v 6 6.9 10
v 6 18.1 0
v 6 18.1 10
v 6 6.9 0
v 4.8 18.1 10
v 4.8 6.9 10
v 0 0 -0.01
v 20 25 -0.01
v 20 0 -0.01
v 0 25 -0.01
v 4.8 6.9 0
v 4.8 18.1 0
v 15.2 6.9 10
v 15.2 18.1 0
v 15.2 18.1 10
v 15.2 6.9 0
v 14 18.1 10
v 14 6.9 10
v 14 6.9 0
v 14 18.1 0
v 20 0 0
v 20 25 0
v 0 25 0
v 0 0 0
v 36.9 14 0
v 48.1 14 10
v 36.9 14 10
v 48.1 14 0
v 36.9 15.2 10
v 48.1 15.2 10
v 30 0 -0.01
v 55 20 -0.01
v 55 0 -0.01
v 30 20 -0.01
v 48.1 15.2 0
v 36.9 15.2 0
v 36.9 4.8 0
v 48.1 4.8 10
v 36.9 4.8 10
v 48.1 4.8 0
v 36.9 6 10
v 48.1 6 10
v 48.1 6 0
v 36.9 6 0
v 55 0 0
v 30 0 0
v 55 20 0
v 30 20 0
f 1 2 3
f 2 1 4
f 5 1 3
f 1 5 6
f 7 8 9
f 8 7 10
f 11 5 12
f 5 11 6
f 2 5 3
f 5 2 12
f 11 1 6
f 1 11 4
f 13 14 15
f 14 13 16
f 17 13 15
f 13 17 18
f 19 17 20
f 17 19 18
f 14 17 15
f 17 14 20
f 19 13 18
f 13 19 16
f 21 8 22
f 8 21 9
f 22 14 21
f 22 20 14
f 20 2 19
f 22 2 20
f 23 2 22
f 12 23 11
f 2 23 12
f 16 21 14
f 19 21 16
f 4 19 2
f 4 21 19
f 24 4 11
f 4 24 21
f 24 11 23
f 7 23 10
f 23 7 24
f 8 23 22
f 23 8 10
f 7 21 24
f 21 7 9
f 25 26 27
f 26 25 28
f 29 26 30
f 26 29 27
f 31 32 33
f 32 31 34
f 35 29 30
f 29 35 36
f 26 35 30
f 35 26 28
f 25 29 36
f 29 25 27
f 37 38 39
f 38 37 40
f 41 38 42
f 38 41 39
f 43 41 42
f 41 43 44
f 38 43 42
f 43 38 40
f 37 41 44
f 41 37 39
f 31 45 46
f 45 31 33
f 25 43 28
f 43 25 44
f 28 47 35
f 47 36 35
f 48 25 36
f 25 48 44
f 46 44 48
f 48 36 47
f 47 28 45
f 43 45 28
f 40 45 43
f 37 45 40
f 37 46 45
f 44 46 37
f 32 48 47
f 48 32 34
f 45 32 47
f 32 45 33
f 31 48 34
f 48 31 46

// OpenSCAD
// file: ../../Base/Boxes.scad
// Fischertechnik Box Foundation
// Pre-designed Boxes

use <Constants.scad>

include <PlacementOptions.scad>

box190Width = 190;
box190Depth = 130;
box130Width = 130;
box130Depth = 95;
boxUsageHeight = 33.9;
boxWallThickness = 2.4;
boxBaseThickness = 1.0;

// getBoxWallThickness()
// Gets the wall thickness of a Fischertechnik Box

function getBoxWallThickness() = boxWallThickness;

// Gets the usable height of a fischertechnik box
function getBoxUsageHeight() = boxUsageHeight;

// Gets the thickness of the Fischertechnik box base.
function getBoxBaseThickness() = boxBaseThickness;

// Gets the usable inner space of a Box 190 as an x/y-list
function getBox190Space() = [
    box190Width - 2*getBoxWallThickness(), 
    box190Depth - 2*getBoxWallThickness() ];

// Imports the Fischertechnik empty box 130x190 mm and places it at position 0,0
// 190x130 are the outer sizes, the inner space is slightly smaller. Use getBox190Space() to get the inner sizes.
// This module needs the STL file "Fischertechnik Box 130x190.stl" in the library path.
// The box is positioned that the usable inner space is at the 0,0,0 position. The

module Box190() {
    translate([-getBoxWallThickness(),-getBoxWallThickness(),-getBoxBaseThickness()])
        import("Fischertechnik Box 130x190.stl", convexity=3);
}

// Gets the usable inner space of a Box 130 as an x/y-list
function getBox130Space() = [
    box130Width - 2*getBoxWallThickness(), 
    box130Depth - 2*getBoxWallThickness() ];

// Imports the Fischertechnik empty box 95x130 mm and places it at position 0,0
// 190x130 are the outer sizes, the inner space is slightly smaller. Use getBox190Space() to get the inner sizes.
// This module needs the STL file "Fischertechnik Box 95x130.stl" in the library path.
// The box is positioned that the usable inner space is at the 0,0,0 position. The

module Box130() {
    translate([-getBoxWallThickness(),-getBoxWallThickness(),-getBoxBaseThickness()])
        import("Fischertechnik Box 95x130.stl", convexity=3);
}

// Creates a web at the specified box walls
// corner 0 = LowerLeft, 1 = UpperLeft, 2 = UpperRight, 3 = LowerRight
// side 0 = LeftOfCorner, 1 = RightOfCorner
// distance = Distance in mm from the corner
// box = inner width and depth of the box (default: Box 190)
// webWidth = length of the web (default is 3 mms)
// webThickness = thickness of the web (default is 1 mm)

module BoxWeb(corner, side, distance, box=getBox190Space(), webWidth=3, webThickness=1.0) {
    sink = getBoxWallThickness()/2;

    width = (corner % 2 == 0) ? 
            (side == LeftOfCorner ? webWidth : webThickness) :
            (side == LeftOfCorner ? webThickness : webWidth);

    depth = (corner % 2 == 0) ? 
            (side == RightOfCorner ? webWidth : webThickness) :
            (side == RightOfCorner ? webThickness : webWidth);
    
    xDiff = corner == LowerLeft ? 
                (side == LeftOfCorner ? -sink : distance) :
            (corner == UpperLeft ?                
                (side == LeftOfCorner ? distance : -sink) :
            (corner == UpperRight ?
                (side == LeftOfCorner ? box.x-webWidth+sink : box.x-distance-webThickness) :
                (side == LeftOfCorner ? box.x-distance-webThickness: box.x-webWidth+sink)));

    yDiff = corner == LowerLeft ? 
                (side == RightOfCorner ? -sink : distance) :
            (corner == UpperLeft ?
                (side == RightOfCorner ? box.y-distance : box.y-webWidth+sink) :
            (corner == UpperRight ?
                (side == RightOfCorner ? box.y-webWidth+sink : box.y-distance) :
                (side == RightOfCorner ? distance : -sink)));
    
    translate([xDiff, yDiff, -getExcess()])
        cube([width, depth, boxUsageHeight + 2*getExcess()]);
}
// file: ../../Base/Rotation.scad
// Fischertechnik Box Foundation
// Geometry Helpers Rotation

include <PlacementOptions.scad>

// getRotatedSpace(space, rotation=NoRotation)
// Rotates the space dependent on the specified rotation

function getRotatedSpace(space, rotation=NoRotation) = [
    (rotation == Rotate90 || rotation == Rotate270) ? space.y : space.x,
    (rotation == Rotate90 || rotation == Rotate270) ? space.x : space.y
];

// Rotates the given space around the fixed left lower corner
// space = the space the children needs as width/depth list [width,depth]
// rotation = 0 Rotate0 degrees, 1 Rotate90 degrees, 2 Rotate180 degrees, 3 Rotate270 degrees (equivalent to -90)

module RotateFix(space, rotation=Rotate0) {
    dy = (rotation == Rotate0 || rotation == Rotate270) ? 0 :
        (rotation == Rotate90) ? space.x :
        space.y;
    dx = (rotation < Rotate180) ? 0 :
        (rotation == Rotate180) ? space.x :
        space.y;
    
    translate([dx, dy, 0])
        rotate([0, 0, rotations[rotation]])
            children();
}
// file: ../../Base/Alignment.scad
// Fischertechnik Box Foundation
// Geometry Helpers Alignment

include <PlacementOptions.scad>

// getAlignedX(elementWidth, spaceWidth, align=AlignRight, offset=0)
// Gets the aligned X offset of an element with the given
// width in the given space.
// elementWidth = The width of the element to positon
// spaceWidth = The space where the element should be aligned
// align = 0 AlignLeft, 1 AlignCenter, 2 AlignRight
// offset = an optional offset from the aligned position. When
// aligned left or centered, then positive values are in X direction.
// When aligned right then positive values are in negative X direction.

function getAlignedX(elementWidth, spaceWidth, align=AlignRight, offset=0) =
    (align == AlignLeft) ?
        offset :
        ((align == AlignCenter) ?
        (spaceWidth - elementWidth)/2 + offset :
        spaceWidth - offset - elementWidth);

// getAlignedY(elementDepth, spaceDepth, align=AlignTop, offset=0)
// Gets the aligned Y offset of an element with the given
// depth in the given space.
// elementDepth = The depth of the element to positon
// spaceDepth = The space where the element should be aligned
// align = 0 AlignBottom, 1 AlignCenter, 2 AlignTop
// offset = an optional offset from the aligned position. When
// aligned bottom or centered, then positive values are in Y direction.
// When aligned top then positive values are in negative Y direction.

function getAlignedY(elementDepth, spaceDepth, align=AlignTop, offset=0) =
    (align == AlignBottom) ?
        offset :
        ((align == AlignCenter) ?
        (spaceDepth - elementDepth)/2 + offset :
        spaceDepth - offset - elementDepth);
// file: ../../Base/Constants.scad
// Fischertechnik Box Foundation
// Constants

// Constant values necessary for multiple elements

// Base constants
dividerThickness = 1.2;
excess = 0.01;
fragments = 90;
tolerance = 0.8;

// Gets the thickness of a divider 
function getDividerThickness() = dividerThickness;

// Gets the excess that is used to merge walls into each other
function getExcess() = excess;

// Gets amount of fragments of a cylinder
function getFragments() = fragments;

// Gets the inner tolerance of a frame to each side
function getTolerance() = tolerance;


// Fischertechnik specific constants
axisDiameter = 4;
axisBottomDiameter = axisDiameter + 1;
standardEdgeDistance = 2.5;
standardWebDistance = 11.5;
standardCornerLength = 15;
tubeWallFactor = 1.6;

// Gets axis diameter
function getAxisDiameter() = axisDiameter;

// Gets axis bottom diameter for thicker part at the bottom
function getAxisBottomDiameter() = axisBottomDiameter;

// gets the standard distance to the wall of the box for dockable frames with webs
function getStandardEdgeDistance() = standardEdgeDistance;

// gets the standard distance of each web to the corner of the dockable frame
function getStandardWebDistance() = standardWebDistance;

// gets the standard length of the corner walls of a dockable frame
function getStandardCornerLength() = standardCornerLength;

// gets the wall thickness of a tube.
function getTubeWallThickness() = tubeWallFactor * getDividerThickness();
// file: ../../Base/PlacementOptions.scad
// Fischertechnik Box Foundation
// Placement Options

// Alignment
NoAlign = 0;
AlignLeft = 1;
AlignBottom = 2;
AlignCenter = 3;
AlignRight = 4;
AlignTop = 5;

// Element rotation degree steps
rotations = [0, -90, -180, -270];

// Rotation
NoRotation = 0;
Rotate0 = 0;
Rotate90 = 1;
Rotate180 = 2;
Rotate270 = 3;

// Docking (seen from above)
NoDock = -1;
DockLeft = 0;
DockTop = 1;
DockRight = 2;
DockCorner = 2;
DockBottom = 3;

// Web corners
LowerLeft = 0;
UpperLeft = 1;
UpperRight = 2;
LowerRight = 3;

// Web position relative to corner
LeftOfCorner = 0;
RightOfCorner = 1;
// file: ../../Elements/HolderWinchDrum.scad
// Fischertechnik Box Library
// Holder for Winch Drum
// 31016

use <../Base/Constants.scad>
use <../Base/Placement.scad>
use <../ModelBase/Simple.scad>

width = 20;
depth = 25;
height = 10;

// getWinchDrumHolderSpace()
// Gets the space the winch drum holder needs as width and depth (.x and .y as a list)

function getHolderWinchDrumSpace() = [width, depth, height];

// HolderWinchDrum()
// Two walls for holding the 31016 winch drum.

module HolderWinchDrum() {
    holderDepth = 11.2;
    holderDistance = 8;
    
    Space(getHolderWinchDrumSpace());
    
    module Holders() {
        Wall([getDividerThickness(), holderDepth, height]);
        translate([holderDistance + getDividerThickness(), 0])
            Wall([getDividerThickness(), holderDepth, height]);
    }
    
    Center(getHolderWinchDrumSpace(), [holderDistance + 2*getDividerThickness(), holderDepth]) {
        Holders();
    }
}

// Tests
color("lightgray")
HolderWinchDrum();
// file: ../../Base/Placement.scad
// Fischertechnik Box Foundation
// Geometry Helpers Placement

use <Constants.scad>
use <Alignment.scad>
use <Rotation.scad>
use <Boxes.scad>

include <PlacementOptions.scad>

// Place(x=0, y=0, elementSpace=[0,0], alignX=AlignLeft, alignY=AlignBottom, rotation=Rotate0, boxSpace=getBox190Space())
// Places the child at the specified position
// y = Y-Position. This is a relative position when an X aligment is specified.
// x = X-Position. This is a relative position when an Y aligment is specified.
// elementSpace = space of the element to be placed [x,y]
// alignX = -1=NoAlign, 0 AlignLeft, 1 AlignCenter, 3 AlignRight (elementSpace and boxSpace required!)
// alignY = -1=NoAlign, 2 AlignBottom, 1 AlignCenter, 4 AlignTop (elementSpace and boxSpace required!)
// rotation = 0 Rotate0 0 degrees, 1 Rotate90 90 degrees, 
// 2 Rotate180 180 degrees, 3 Rotate270 270 degrees (equivalent to -90)
// boxSpace = Inner space of the box where the placement occurs [x,y] - default is Box 190x130 inner space

module Place(x=0, y=0, elementSpace=[0,0], 
  alignX=AlignLeft, alignY=AlignBottom, 
  rotation=NoRotation, boxSpace=getBox190Space()) {

    module Position(x, y, space, rotation=Rotate0) {
        translate([x, y, 0])
            RotateFix(space, rotation)
                children(0);
    }

    space = getRotatedSpace(elementSpace, rotation);
    alignedX = getAlignedX(space.x, boxSpace.x, alignX, x);
    alignedY = getAlignedY(space.y, boxSpace.y, alignY, y);
    Position(alignedX, alignedY, elementSpace, rotation)
        children(0);
}

// Center(space=getBox130Space(), elementSpace=[0,0])
// space = Space where the children is centered. For cylinder use centered=true and no elementSpace.
// elementSpace = space of the element to be centered [x,y]

module Center(space=getBox190Space(), elementSpace=[0,0]) {
    translate([(space.x - elementSpace.x) / 2, (space.y - elementSpace.y) / 2])
        children(0);
}

// CenterHorizontal(width=0, y=0, offset=0, space=getBox130Space())
// space = Space where the children is centered. For cylinder use centered=true and no elementSpace.
// elementSpace = space of the element to be centered [x,y]

module CenterHorizontal(width=0, y=0, offset=0, space=getBox190Space()) {
    translate([(space.x - width) / 2 + offset, y])
        children(0);
}

// CenterVertical(depth=0, x=0, offset=0, space=getBox130Space())
// space = Space where the children is centered. For cylinder use centered=true and no elementSpace.
// elementSpace = space of the element to be centered [x,y]

module CenterVerticalal(depth=0, x=0, offset=0, space=getBox190Space()) {
    translate([x, (space.y - depth) / 2 + offset])
        children(0);
}
// main file
// Fischertechnik Box Foundation
// Elements
// Test HolderWinchDrum

use <../../Base/Placement.scad>
use <../../Elements/HolderWinchDrum.scad>

include <../../Base/PlacementOptions.scad>

HolderWinchDrum();

Place(30, 0, elementSpace=getHolderWinchDrumSpace(), rotation=Rotate90)
    HolderWinchDrum();
